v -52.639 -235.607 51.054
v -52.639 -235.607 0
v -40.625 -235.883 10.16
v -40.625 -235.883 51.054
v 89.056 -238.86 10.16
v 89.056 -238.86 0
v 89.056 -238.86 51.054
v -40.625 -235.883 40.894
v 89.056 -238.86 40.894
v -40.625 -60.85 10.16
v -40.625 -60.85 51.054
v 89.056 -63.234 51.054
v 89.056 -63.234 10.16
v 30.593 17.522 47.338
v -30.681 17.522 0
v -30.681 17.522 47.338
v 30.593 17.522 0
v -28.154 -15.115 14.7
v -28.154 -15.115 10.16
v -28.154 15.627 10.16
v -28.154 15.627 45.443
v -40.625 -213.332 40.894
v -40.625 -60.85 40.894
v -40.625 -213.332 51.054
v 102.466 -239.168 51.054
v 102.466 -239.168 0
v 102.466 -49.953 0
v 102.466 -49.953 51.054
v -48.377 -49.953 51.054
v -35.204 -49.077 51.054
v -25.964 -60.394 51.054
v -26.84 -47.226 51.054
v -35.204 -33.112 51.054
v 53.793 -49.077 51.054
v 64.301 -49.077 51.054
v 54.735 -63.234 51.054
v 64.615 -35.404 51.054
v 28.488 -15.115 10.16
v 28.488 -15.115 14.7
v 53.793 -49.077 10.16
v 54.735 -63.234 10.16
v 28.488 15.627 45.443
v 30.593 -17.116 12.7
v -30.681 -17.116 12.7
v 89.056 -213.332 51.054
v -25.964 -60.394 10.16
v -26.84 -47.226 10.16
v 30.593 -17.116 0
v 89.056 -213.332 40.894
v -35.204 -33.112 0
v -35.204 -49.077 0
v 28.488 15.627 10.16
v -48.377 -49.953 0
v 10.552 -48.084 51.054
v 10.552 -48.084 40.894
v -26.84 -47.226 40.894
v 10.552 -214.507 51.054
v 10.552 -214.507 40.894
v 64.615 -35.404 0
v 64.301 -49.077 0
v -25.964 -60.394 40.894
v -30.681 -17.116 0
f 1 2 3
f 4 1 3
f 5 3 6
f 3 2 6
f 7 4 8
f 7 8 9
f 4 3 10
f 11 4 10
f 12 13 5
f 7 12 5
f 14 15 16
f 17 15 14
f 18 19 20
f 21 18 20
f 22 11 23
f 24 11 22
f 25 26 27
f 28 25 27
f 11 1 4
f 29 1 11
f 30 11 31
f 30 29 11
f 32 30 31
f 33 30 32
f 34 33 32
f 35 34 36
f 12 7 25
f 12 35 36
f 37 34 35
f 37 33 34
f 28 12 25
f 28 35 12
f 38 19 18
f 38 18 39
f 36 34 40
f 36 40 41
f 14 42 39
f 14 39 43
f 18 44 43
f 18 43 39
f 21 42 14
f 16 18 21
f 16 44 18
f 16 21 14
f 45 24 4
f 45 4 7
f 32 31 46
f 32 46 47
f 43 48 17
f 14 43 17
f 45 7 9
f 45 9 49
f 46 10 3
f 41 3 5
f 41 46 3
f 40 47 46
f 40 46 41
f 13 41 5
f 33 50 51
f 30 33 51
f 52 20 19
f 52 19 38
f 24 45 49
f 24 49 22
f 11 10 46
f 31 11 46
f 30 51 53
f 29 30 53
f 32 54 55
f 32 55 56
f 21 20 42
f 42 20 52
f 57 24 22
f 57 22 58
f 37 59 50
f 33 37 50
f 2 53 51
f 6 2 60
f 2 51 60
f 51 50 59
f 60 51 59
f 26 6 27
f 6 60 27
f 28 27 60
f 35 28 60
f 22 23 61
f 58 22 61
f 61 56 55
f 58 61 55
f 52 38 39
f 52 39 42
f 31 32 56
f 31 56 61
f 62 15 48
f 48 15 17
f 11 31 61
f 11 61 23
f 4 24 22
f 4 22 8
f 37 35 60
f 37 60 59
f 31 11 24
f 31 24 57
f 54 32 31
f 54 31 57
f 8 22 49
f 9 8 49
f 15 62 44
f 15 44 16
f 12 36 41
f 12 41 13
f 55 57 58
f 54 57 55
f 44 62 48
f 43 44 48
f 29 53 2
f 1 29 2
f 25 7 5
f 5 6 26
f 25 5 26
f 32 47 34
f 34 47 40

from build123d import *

# Parameters (mm, degrees)
F1_DEPTH     = 51.054
F2_DEPTH     = 10.16
F4_DEPTH     = 10.16
F6_DEPTH     = 10.16
F7_W         = 56.6421095282
F7_H         = 30.7425558567
F8_DEPTH     = 10.16
F7_W_2       = 61.2745471299
F7_H_2       = 34.6380155534
F9_DEPTH     = 63.5
F10_T1_DEPTH = 322.5575387072


# Not quite as in the source:
# - a fillet or chamfer that OpenCascade refuses, or shapes differently, is made with other operations: its cross-section is extruded or revolved along the edge and cut away or added


with BuildPart() as f1:
    # F0 (on Top) → F1 (new body)
    with BuildSketch(Plane.XY):
        Polygon((-35.2039023449, -49.0766943542), (-48.3769522073, -49.9528594767), (-52.6391126395, -235.6071644364), (-40.6254976988, -235.8829671131), (-40.6254976988, -60.8498267829), (-25.9644463658, -60.3935308754), (-26.8402741919, -47.2255522284), (53.7931299761, -49.0766943542), (54.7347292304, -63.2335394621), (89.056285343, -63.2335394621), (89.056285343, -238.8601378529), (102.4658605456, -239.1679883003), (102.4658605456, -49.9528594767), (64.3012185928, -49.0766943542), (64.6151083374, -35.4040550191), (-35.2039023449, -33.1124591533), align=None)
    extrude(amount=F1_DEPTH)

    # F0 (on Top) → F2 (join)
    with BuildSketch(Plane.XY):
        Polygon((-40.6254976988, -60.8498267829), (-40.6254976988, -235.8829671131), (89.056285343, -238.8601378529), (89.056285343, -63.2335394621), (54.7347292304, -63.2335394621), (53.7931299761, -49.0766943542), (-26.8402741919, -47.2255522284), (-25.9644463658, -60.3935308754), align=None)
    extrude(amount=F2_DEPTH)


with BuildPart() as f4:
    # F3 (on face) → F4 (new body)
    with BuildSketch(Plane.XY.offset(51.054)):
        Polygon((-40.6254976988, -213.3320122957), (-40.6254976988, -235.8829671131), (89.056285343, -238.8601378529), (89.056285343, -213.3320122957), align=None)
    extrude(amount=-F4_DEPTH)


with BuildPart() as f6:
    # F5 (on face) → F6 (new body)
    with BuildSketch(Plane.XY.offset(51.054)):
        Polygon((-40.6254976988, -60.8498267829), (-40.6254976988, -213.3318930864), (10.5520575639, -214.5068022872), (10.5520575639, -48.0839870323), (-26.8402741919, -47.2255522284), (-25.9644463658, -60.3935308754), align=None)
    extrude(amount=-F6_DEPTH)


with BuildPart() as f8:
    # F7 (on Top) → F8 (new body)
    with BuildSketch(Plane.XY):
        with Locations((0.1666704193, 0.2558268607)):
            Rectangle(F7_W, F7_H)
    extrude(amount=F8_DEPTH)

    # F7 (on Top) → F9 (join)
    with BuildSketch(Plane.XY):
        with Locations((-0.0438950956, 0.2031857148)):
            Rectangle(F7_W_2, F7_H_2)
        with Locations((0.1666704193, 0.2558268607)):
            Rectangle(F7_W, F7_H, mode=Mode.SUBTRACT)
    extrude(amount=F9_DEPTH)

    # F10: chamfer of 50.8 on 1 edges, made by hand

    # F10_s2 → F10_t1 (cut)
    with BuildSketch(Plane.YZ.offset(-161.3226644492)):
        Polygon((-17.1158220619, 12.7), (33.6841779381, 63.5), (-17.1158220619, 63.5), align=None)
    extrude(amount=F10_T1_DEPTH, mode=Mode.SUBTRACT)


solid = Compound([f1.part, f4.part, f6.part, f8.part])
